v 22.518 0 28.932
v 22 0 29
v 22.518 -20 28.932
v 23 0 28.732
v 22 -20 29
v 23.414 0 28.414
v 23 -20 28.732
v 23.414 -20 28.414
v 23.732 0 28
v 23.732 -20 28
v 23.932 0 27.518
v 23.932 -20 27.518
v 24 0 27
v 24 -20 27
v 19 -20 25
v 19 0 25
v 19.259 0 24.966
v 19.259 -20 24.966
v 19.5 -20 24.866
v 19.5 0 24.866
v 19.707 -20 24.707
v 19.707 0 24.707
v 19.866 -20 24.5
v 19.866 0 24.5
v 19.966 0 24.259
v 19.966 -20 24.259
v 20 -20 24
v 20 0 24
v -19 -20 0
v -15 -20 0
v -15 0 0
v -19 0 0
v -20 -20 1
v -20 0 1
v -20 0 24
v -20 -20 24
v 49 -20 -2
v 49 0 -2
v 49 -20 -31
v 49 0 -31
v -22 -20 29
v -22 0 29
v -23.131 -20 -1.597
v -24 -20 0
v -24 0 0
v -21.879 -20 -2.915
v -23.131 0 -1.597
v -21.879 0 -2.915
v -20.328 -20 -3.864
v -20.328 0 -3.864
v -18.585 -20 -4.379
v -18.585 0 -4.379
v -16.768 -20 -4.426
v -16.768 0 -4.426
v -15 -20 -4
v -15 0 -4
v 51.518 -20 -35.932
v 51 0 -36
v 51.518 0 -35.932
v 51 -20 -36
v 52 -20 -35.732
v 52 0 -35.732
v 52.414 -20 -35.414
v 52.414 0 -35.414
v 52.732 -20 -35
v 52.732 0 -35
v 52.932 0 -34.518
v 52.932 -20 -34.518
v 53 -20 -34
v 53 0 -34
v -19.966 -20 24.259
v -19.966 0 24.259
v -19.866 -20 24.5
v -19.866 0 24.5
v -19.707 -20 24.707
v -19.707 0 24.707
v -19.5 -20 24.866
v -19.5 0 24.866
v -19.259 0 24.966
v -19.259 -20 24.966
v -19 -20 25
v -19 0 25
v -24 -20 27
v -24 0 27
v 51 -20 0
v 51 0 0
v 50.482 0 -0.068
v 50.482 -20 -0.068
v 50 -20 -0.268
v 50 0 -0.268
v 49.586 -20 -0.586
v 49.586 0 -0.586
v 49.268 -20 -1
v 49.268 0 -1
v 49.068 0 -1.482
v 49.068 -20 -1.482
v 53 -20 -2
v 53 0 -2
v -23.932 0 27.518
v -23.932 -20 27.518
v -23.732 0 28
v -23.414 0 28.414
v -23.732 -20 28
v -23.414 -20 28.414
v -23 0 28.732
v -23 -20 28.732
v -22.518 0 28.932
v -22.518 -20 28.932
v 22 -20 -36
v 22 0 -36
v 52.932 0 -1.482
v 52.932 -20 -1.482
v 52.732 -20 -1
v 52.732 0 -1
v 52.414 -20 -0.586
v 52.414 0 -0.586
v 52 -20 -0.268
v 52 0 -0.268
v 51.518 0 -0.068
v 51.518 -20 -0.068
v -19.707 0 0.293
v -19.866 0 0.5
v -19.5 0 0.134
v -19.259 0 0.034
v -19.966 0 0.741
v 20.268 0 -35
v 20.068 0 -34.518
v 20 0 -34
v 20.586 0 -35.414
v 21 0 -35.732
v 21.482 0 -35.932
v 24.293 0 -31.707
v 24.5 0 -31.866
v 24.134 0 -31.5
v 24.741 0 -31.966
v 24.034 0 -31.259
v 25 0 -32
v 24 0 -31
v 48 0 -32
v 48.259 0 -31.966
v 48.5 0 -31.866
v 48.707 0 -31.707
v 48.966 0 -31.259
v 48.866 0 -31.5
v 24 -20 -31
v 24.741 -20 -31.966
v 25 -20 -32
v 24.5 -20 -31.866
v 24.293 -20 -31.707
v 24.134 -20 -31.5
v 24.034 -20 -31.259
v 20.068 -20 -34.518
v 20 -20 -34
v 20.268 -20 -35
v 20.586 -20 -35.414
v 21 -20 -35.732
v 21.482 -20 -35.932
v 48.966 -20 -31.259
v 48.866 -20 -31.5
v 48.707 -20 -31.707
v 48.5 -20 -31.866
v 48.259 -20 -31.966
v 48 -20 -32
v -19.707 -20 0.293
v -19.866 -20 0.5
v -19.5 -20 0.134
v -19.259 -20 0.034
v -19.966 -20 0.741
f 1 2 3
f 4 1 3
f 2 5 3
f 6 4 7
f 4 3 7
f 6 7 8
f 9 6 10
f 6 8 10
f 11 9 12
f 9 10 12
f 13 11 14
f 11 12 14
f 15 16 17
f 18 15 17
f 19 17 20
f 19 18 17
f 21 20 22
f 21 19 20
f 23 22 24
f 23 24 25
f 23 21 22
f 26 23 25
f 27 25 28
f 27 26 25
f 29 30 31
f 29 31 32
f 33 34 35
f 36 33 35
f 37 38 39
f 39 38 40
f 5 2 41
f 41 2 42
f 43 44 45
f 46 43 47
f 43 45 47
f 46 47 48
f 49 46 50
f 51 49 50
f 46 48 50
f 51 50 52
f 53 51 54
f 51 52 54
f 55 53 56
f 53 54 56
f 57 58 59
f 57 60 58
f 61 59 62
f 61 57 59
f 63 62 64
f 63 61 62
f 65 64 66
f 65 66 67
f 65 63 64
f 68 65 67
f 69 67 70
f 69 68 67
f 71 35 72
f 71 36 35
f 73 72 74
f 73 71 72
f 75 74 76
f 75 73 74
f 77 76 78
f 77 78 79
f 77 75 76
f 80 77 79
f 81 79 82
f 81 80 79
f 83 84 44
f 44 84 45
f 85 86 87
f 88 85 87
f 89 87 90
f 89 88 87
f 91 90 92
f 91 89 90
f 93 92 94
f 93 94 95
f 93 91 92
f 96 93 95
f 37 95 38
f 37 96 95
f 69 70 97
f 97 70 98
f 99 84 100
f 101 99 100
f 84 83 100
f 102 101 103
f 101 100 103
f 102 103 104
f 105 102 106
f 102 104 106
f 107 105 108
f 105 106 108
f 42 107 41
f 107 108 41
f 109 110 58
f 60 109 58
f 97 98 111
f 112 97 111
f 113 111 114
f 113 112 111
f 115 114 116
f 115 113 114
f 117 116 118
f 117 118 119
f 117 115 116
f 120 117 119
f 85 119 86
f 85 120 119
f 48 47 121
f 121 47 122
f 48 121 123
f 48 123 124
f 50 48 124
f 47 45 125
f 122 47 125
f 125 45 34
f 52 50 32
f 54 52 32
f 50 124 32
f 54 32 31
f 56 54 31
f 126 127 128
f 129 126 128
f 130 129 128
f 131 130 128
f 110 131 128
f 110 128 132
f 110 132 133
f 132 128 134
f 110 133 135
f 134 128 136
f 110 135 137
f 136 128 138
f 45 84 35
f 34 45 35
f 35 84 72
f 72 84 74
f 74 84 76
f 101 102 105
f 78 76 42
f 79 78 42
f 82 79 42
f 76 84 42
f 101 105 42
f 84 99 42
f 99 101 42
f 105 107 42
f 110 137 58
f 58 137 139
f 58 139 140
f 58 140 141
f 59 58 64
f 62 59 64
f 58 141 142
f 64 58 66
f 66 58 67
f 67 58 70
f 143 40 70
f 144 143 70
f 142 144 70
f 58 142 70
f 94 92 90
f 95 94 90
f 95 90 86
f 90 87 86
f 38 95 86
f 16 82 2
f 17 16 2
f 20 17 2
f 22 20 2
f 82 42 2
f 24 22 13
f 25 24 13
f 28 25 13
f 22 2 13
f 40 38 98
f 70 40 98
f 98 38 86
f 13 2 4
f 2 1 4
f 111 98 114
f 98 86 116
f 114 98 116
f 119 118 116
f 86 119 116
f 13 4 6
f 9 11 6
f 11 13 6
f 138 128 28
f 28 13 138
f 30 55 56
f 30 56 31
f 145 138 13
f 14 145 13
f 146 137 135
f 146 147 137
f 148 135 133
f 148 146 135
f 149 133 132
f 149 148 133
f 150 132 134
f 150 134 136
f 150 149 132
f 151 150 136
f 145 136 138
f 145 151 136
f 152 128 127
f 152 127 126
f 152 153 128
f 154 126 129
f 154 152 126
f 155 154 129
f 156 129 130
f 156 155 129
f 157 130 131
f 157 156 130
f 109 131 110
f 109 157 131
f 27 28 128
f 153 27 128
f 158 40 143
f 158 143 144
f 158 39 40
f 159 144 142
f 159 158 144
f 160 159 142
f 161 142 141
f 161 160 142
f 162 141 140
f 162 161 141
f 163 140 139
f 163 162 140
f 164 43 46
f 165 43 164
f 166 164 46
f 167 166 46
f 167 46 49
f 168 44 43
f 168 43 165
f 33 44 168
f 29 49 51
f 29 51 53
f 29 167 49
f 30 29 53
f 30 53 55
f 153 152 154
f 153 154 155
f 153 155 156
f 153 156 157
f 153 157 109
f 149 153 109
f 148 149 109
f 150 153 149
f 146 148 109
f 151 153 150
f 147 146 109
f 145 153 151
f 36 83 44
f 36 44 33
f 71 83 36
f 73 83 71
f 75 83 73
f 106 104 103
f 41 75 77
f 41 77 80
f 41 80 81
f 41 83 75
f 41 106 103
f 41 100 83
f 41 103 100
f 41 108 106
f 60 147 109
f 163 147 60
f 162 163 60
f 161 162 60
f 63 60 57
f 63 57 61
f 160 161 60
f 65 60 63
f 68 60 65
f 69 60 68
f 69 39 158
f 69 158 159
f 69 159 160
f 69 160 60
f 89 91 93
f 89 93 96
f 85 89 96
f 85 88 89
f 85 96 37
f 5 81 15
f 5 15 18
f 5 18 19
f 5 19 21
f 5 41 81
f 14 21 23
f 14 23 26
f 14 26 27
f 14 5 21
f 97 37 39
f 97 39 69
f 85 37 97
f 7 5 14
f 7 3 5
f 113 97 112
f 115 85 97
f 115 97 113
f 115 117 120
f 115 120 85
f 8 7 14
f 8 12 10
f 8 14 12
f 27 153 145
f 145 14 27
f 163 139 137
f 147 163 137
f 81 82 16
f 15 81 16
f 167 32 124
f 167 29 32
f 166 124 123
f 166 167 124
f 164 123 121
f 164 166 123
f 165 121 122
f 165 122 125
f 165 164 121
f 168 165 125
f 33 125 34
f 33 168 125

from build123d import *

# Parameters (mm, degrees)
F1_DEPTH = 20
F2_R     = 1
F3_R     = 1.99999


# Not quite as in the source:
# - a fillet or chamfer is up to 0.001 mm smaller than in the source, because OpenCascade refuses the exact size


with BuildPart() as f1:
    # F0 (on Front) → F1 (new body)
    with BuildSketch(Plane.XZ):
        Polygon((-24, 29), (-24, 0), (-20, 0), (-20, 25), (20, 25), (20, -36), (53, -36), (53, 0), (49, 0), (49, -32), (24, -32), (24, 29), align=None)
        with BuildLine():
            Line((-20, 0), (-24, 0))
            ThreePointArc((-24, 0), (-20.3284271247, -3.8639610307), (-15, -4))
            Line((-15, -4), (-15, 0))
            Line((-15, 0), (-20, 0))
        make_face()
    extrude(amount=F1_DEPTH)

    # F2
    f2_edges = [f1.edges().sort_by_distance(p)[0] for p in [
        (-20, -10, 0),
        (-20, -10, 25),
        (20, -10, 25),
        (24, -10, -32),
        (49, -10, -32),
    ]]
    fillet(f2_edges, radius=F2_R)

    # F3 (radius 2 in the source; OpenCascade refuses exactly that, so slightly less here)
    f3_edges = [f1.edges().sort_by_distance(p)[0] for p in [
        (-24, -10, 29),
        (24, -10, 29),
        (20, -10, -36),
        (53, -10, -36),
        (49, -10, 0),
        (53, -10, 0),
    ]]
    fillet(f3_edges, radius=F3_R)


solid = f1.part
